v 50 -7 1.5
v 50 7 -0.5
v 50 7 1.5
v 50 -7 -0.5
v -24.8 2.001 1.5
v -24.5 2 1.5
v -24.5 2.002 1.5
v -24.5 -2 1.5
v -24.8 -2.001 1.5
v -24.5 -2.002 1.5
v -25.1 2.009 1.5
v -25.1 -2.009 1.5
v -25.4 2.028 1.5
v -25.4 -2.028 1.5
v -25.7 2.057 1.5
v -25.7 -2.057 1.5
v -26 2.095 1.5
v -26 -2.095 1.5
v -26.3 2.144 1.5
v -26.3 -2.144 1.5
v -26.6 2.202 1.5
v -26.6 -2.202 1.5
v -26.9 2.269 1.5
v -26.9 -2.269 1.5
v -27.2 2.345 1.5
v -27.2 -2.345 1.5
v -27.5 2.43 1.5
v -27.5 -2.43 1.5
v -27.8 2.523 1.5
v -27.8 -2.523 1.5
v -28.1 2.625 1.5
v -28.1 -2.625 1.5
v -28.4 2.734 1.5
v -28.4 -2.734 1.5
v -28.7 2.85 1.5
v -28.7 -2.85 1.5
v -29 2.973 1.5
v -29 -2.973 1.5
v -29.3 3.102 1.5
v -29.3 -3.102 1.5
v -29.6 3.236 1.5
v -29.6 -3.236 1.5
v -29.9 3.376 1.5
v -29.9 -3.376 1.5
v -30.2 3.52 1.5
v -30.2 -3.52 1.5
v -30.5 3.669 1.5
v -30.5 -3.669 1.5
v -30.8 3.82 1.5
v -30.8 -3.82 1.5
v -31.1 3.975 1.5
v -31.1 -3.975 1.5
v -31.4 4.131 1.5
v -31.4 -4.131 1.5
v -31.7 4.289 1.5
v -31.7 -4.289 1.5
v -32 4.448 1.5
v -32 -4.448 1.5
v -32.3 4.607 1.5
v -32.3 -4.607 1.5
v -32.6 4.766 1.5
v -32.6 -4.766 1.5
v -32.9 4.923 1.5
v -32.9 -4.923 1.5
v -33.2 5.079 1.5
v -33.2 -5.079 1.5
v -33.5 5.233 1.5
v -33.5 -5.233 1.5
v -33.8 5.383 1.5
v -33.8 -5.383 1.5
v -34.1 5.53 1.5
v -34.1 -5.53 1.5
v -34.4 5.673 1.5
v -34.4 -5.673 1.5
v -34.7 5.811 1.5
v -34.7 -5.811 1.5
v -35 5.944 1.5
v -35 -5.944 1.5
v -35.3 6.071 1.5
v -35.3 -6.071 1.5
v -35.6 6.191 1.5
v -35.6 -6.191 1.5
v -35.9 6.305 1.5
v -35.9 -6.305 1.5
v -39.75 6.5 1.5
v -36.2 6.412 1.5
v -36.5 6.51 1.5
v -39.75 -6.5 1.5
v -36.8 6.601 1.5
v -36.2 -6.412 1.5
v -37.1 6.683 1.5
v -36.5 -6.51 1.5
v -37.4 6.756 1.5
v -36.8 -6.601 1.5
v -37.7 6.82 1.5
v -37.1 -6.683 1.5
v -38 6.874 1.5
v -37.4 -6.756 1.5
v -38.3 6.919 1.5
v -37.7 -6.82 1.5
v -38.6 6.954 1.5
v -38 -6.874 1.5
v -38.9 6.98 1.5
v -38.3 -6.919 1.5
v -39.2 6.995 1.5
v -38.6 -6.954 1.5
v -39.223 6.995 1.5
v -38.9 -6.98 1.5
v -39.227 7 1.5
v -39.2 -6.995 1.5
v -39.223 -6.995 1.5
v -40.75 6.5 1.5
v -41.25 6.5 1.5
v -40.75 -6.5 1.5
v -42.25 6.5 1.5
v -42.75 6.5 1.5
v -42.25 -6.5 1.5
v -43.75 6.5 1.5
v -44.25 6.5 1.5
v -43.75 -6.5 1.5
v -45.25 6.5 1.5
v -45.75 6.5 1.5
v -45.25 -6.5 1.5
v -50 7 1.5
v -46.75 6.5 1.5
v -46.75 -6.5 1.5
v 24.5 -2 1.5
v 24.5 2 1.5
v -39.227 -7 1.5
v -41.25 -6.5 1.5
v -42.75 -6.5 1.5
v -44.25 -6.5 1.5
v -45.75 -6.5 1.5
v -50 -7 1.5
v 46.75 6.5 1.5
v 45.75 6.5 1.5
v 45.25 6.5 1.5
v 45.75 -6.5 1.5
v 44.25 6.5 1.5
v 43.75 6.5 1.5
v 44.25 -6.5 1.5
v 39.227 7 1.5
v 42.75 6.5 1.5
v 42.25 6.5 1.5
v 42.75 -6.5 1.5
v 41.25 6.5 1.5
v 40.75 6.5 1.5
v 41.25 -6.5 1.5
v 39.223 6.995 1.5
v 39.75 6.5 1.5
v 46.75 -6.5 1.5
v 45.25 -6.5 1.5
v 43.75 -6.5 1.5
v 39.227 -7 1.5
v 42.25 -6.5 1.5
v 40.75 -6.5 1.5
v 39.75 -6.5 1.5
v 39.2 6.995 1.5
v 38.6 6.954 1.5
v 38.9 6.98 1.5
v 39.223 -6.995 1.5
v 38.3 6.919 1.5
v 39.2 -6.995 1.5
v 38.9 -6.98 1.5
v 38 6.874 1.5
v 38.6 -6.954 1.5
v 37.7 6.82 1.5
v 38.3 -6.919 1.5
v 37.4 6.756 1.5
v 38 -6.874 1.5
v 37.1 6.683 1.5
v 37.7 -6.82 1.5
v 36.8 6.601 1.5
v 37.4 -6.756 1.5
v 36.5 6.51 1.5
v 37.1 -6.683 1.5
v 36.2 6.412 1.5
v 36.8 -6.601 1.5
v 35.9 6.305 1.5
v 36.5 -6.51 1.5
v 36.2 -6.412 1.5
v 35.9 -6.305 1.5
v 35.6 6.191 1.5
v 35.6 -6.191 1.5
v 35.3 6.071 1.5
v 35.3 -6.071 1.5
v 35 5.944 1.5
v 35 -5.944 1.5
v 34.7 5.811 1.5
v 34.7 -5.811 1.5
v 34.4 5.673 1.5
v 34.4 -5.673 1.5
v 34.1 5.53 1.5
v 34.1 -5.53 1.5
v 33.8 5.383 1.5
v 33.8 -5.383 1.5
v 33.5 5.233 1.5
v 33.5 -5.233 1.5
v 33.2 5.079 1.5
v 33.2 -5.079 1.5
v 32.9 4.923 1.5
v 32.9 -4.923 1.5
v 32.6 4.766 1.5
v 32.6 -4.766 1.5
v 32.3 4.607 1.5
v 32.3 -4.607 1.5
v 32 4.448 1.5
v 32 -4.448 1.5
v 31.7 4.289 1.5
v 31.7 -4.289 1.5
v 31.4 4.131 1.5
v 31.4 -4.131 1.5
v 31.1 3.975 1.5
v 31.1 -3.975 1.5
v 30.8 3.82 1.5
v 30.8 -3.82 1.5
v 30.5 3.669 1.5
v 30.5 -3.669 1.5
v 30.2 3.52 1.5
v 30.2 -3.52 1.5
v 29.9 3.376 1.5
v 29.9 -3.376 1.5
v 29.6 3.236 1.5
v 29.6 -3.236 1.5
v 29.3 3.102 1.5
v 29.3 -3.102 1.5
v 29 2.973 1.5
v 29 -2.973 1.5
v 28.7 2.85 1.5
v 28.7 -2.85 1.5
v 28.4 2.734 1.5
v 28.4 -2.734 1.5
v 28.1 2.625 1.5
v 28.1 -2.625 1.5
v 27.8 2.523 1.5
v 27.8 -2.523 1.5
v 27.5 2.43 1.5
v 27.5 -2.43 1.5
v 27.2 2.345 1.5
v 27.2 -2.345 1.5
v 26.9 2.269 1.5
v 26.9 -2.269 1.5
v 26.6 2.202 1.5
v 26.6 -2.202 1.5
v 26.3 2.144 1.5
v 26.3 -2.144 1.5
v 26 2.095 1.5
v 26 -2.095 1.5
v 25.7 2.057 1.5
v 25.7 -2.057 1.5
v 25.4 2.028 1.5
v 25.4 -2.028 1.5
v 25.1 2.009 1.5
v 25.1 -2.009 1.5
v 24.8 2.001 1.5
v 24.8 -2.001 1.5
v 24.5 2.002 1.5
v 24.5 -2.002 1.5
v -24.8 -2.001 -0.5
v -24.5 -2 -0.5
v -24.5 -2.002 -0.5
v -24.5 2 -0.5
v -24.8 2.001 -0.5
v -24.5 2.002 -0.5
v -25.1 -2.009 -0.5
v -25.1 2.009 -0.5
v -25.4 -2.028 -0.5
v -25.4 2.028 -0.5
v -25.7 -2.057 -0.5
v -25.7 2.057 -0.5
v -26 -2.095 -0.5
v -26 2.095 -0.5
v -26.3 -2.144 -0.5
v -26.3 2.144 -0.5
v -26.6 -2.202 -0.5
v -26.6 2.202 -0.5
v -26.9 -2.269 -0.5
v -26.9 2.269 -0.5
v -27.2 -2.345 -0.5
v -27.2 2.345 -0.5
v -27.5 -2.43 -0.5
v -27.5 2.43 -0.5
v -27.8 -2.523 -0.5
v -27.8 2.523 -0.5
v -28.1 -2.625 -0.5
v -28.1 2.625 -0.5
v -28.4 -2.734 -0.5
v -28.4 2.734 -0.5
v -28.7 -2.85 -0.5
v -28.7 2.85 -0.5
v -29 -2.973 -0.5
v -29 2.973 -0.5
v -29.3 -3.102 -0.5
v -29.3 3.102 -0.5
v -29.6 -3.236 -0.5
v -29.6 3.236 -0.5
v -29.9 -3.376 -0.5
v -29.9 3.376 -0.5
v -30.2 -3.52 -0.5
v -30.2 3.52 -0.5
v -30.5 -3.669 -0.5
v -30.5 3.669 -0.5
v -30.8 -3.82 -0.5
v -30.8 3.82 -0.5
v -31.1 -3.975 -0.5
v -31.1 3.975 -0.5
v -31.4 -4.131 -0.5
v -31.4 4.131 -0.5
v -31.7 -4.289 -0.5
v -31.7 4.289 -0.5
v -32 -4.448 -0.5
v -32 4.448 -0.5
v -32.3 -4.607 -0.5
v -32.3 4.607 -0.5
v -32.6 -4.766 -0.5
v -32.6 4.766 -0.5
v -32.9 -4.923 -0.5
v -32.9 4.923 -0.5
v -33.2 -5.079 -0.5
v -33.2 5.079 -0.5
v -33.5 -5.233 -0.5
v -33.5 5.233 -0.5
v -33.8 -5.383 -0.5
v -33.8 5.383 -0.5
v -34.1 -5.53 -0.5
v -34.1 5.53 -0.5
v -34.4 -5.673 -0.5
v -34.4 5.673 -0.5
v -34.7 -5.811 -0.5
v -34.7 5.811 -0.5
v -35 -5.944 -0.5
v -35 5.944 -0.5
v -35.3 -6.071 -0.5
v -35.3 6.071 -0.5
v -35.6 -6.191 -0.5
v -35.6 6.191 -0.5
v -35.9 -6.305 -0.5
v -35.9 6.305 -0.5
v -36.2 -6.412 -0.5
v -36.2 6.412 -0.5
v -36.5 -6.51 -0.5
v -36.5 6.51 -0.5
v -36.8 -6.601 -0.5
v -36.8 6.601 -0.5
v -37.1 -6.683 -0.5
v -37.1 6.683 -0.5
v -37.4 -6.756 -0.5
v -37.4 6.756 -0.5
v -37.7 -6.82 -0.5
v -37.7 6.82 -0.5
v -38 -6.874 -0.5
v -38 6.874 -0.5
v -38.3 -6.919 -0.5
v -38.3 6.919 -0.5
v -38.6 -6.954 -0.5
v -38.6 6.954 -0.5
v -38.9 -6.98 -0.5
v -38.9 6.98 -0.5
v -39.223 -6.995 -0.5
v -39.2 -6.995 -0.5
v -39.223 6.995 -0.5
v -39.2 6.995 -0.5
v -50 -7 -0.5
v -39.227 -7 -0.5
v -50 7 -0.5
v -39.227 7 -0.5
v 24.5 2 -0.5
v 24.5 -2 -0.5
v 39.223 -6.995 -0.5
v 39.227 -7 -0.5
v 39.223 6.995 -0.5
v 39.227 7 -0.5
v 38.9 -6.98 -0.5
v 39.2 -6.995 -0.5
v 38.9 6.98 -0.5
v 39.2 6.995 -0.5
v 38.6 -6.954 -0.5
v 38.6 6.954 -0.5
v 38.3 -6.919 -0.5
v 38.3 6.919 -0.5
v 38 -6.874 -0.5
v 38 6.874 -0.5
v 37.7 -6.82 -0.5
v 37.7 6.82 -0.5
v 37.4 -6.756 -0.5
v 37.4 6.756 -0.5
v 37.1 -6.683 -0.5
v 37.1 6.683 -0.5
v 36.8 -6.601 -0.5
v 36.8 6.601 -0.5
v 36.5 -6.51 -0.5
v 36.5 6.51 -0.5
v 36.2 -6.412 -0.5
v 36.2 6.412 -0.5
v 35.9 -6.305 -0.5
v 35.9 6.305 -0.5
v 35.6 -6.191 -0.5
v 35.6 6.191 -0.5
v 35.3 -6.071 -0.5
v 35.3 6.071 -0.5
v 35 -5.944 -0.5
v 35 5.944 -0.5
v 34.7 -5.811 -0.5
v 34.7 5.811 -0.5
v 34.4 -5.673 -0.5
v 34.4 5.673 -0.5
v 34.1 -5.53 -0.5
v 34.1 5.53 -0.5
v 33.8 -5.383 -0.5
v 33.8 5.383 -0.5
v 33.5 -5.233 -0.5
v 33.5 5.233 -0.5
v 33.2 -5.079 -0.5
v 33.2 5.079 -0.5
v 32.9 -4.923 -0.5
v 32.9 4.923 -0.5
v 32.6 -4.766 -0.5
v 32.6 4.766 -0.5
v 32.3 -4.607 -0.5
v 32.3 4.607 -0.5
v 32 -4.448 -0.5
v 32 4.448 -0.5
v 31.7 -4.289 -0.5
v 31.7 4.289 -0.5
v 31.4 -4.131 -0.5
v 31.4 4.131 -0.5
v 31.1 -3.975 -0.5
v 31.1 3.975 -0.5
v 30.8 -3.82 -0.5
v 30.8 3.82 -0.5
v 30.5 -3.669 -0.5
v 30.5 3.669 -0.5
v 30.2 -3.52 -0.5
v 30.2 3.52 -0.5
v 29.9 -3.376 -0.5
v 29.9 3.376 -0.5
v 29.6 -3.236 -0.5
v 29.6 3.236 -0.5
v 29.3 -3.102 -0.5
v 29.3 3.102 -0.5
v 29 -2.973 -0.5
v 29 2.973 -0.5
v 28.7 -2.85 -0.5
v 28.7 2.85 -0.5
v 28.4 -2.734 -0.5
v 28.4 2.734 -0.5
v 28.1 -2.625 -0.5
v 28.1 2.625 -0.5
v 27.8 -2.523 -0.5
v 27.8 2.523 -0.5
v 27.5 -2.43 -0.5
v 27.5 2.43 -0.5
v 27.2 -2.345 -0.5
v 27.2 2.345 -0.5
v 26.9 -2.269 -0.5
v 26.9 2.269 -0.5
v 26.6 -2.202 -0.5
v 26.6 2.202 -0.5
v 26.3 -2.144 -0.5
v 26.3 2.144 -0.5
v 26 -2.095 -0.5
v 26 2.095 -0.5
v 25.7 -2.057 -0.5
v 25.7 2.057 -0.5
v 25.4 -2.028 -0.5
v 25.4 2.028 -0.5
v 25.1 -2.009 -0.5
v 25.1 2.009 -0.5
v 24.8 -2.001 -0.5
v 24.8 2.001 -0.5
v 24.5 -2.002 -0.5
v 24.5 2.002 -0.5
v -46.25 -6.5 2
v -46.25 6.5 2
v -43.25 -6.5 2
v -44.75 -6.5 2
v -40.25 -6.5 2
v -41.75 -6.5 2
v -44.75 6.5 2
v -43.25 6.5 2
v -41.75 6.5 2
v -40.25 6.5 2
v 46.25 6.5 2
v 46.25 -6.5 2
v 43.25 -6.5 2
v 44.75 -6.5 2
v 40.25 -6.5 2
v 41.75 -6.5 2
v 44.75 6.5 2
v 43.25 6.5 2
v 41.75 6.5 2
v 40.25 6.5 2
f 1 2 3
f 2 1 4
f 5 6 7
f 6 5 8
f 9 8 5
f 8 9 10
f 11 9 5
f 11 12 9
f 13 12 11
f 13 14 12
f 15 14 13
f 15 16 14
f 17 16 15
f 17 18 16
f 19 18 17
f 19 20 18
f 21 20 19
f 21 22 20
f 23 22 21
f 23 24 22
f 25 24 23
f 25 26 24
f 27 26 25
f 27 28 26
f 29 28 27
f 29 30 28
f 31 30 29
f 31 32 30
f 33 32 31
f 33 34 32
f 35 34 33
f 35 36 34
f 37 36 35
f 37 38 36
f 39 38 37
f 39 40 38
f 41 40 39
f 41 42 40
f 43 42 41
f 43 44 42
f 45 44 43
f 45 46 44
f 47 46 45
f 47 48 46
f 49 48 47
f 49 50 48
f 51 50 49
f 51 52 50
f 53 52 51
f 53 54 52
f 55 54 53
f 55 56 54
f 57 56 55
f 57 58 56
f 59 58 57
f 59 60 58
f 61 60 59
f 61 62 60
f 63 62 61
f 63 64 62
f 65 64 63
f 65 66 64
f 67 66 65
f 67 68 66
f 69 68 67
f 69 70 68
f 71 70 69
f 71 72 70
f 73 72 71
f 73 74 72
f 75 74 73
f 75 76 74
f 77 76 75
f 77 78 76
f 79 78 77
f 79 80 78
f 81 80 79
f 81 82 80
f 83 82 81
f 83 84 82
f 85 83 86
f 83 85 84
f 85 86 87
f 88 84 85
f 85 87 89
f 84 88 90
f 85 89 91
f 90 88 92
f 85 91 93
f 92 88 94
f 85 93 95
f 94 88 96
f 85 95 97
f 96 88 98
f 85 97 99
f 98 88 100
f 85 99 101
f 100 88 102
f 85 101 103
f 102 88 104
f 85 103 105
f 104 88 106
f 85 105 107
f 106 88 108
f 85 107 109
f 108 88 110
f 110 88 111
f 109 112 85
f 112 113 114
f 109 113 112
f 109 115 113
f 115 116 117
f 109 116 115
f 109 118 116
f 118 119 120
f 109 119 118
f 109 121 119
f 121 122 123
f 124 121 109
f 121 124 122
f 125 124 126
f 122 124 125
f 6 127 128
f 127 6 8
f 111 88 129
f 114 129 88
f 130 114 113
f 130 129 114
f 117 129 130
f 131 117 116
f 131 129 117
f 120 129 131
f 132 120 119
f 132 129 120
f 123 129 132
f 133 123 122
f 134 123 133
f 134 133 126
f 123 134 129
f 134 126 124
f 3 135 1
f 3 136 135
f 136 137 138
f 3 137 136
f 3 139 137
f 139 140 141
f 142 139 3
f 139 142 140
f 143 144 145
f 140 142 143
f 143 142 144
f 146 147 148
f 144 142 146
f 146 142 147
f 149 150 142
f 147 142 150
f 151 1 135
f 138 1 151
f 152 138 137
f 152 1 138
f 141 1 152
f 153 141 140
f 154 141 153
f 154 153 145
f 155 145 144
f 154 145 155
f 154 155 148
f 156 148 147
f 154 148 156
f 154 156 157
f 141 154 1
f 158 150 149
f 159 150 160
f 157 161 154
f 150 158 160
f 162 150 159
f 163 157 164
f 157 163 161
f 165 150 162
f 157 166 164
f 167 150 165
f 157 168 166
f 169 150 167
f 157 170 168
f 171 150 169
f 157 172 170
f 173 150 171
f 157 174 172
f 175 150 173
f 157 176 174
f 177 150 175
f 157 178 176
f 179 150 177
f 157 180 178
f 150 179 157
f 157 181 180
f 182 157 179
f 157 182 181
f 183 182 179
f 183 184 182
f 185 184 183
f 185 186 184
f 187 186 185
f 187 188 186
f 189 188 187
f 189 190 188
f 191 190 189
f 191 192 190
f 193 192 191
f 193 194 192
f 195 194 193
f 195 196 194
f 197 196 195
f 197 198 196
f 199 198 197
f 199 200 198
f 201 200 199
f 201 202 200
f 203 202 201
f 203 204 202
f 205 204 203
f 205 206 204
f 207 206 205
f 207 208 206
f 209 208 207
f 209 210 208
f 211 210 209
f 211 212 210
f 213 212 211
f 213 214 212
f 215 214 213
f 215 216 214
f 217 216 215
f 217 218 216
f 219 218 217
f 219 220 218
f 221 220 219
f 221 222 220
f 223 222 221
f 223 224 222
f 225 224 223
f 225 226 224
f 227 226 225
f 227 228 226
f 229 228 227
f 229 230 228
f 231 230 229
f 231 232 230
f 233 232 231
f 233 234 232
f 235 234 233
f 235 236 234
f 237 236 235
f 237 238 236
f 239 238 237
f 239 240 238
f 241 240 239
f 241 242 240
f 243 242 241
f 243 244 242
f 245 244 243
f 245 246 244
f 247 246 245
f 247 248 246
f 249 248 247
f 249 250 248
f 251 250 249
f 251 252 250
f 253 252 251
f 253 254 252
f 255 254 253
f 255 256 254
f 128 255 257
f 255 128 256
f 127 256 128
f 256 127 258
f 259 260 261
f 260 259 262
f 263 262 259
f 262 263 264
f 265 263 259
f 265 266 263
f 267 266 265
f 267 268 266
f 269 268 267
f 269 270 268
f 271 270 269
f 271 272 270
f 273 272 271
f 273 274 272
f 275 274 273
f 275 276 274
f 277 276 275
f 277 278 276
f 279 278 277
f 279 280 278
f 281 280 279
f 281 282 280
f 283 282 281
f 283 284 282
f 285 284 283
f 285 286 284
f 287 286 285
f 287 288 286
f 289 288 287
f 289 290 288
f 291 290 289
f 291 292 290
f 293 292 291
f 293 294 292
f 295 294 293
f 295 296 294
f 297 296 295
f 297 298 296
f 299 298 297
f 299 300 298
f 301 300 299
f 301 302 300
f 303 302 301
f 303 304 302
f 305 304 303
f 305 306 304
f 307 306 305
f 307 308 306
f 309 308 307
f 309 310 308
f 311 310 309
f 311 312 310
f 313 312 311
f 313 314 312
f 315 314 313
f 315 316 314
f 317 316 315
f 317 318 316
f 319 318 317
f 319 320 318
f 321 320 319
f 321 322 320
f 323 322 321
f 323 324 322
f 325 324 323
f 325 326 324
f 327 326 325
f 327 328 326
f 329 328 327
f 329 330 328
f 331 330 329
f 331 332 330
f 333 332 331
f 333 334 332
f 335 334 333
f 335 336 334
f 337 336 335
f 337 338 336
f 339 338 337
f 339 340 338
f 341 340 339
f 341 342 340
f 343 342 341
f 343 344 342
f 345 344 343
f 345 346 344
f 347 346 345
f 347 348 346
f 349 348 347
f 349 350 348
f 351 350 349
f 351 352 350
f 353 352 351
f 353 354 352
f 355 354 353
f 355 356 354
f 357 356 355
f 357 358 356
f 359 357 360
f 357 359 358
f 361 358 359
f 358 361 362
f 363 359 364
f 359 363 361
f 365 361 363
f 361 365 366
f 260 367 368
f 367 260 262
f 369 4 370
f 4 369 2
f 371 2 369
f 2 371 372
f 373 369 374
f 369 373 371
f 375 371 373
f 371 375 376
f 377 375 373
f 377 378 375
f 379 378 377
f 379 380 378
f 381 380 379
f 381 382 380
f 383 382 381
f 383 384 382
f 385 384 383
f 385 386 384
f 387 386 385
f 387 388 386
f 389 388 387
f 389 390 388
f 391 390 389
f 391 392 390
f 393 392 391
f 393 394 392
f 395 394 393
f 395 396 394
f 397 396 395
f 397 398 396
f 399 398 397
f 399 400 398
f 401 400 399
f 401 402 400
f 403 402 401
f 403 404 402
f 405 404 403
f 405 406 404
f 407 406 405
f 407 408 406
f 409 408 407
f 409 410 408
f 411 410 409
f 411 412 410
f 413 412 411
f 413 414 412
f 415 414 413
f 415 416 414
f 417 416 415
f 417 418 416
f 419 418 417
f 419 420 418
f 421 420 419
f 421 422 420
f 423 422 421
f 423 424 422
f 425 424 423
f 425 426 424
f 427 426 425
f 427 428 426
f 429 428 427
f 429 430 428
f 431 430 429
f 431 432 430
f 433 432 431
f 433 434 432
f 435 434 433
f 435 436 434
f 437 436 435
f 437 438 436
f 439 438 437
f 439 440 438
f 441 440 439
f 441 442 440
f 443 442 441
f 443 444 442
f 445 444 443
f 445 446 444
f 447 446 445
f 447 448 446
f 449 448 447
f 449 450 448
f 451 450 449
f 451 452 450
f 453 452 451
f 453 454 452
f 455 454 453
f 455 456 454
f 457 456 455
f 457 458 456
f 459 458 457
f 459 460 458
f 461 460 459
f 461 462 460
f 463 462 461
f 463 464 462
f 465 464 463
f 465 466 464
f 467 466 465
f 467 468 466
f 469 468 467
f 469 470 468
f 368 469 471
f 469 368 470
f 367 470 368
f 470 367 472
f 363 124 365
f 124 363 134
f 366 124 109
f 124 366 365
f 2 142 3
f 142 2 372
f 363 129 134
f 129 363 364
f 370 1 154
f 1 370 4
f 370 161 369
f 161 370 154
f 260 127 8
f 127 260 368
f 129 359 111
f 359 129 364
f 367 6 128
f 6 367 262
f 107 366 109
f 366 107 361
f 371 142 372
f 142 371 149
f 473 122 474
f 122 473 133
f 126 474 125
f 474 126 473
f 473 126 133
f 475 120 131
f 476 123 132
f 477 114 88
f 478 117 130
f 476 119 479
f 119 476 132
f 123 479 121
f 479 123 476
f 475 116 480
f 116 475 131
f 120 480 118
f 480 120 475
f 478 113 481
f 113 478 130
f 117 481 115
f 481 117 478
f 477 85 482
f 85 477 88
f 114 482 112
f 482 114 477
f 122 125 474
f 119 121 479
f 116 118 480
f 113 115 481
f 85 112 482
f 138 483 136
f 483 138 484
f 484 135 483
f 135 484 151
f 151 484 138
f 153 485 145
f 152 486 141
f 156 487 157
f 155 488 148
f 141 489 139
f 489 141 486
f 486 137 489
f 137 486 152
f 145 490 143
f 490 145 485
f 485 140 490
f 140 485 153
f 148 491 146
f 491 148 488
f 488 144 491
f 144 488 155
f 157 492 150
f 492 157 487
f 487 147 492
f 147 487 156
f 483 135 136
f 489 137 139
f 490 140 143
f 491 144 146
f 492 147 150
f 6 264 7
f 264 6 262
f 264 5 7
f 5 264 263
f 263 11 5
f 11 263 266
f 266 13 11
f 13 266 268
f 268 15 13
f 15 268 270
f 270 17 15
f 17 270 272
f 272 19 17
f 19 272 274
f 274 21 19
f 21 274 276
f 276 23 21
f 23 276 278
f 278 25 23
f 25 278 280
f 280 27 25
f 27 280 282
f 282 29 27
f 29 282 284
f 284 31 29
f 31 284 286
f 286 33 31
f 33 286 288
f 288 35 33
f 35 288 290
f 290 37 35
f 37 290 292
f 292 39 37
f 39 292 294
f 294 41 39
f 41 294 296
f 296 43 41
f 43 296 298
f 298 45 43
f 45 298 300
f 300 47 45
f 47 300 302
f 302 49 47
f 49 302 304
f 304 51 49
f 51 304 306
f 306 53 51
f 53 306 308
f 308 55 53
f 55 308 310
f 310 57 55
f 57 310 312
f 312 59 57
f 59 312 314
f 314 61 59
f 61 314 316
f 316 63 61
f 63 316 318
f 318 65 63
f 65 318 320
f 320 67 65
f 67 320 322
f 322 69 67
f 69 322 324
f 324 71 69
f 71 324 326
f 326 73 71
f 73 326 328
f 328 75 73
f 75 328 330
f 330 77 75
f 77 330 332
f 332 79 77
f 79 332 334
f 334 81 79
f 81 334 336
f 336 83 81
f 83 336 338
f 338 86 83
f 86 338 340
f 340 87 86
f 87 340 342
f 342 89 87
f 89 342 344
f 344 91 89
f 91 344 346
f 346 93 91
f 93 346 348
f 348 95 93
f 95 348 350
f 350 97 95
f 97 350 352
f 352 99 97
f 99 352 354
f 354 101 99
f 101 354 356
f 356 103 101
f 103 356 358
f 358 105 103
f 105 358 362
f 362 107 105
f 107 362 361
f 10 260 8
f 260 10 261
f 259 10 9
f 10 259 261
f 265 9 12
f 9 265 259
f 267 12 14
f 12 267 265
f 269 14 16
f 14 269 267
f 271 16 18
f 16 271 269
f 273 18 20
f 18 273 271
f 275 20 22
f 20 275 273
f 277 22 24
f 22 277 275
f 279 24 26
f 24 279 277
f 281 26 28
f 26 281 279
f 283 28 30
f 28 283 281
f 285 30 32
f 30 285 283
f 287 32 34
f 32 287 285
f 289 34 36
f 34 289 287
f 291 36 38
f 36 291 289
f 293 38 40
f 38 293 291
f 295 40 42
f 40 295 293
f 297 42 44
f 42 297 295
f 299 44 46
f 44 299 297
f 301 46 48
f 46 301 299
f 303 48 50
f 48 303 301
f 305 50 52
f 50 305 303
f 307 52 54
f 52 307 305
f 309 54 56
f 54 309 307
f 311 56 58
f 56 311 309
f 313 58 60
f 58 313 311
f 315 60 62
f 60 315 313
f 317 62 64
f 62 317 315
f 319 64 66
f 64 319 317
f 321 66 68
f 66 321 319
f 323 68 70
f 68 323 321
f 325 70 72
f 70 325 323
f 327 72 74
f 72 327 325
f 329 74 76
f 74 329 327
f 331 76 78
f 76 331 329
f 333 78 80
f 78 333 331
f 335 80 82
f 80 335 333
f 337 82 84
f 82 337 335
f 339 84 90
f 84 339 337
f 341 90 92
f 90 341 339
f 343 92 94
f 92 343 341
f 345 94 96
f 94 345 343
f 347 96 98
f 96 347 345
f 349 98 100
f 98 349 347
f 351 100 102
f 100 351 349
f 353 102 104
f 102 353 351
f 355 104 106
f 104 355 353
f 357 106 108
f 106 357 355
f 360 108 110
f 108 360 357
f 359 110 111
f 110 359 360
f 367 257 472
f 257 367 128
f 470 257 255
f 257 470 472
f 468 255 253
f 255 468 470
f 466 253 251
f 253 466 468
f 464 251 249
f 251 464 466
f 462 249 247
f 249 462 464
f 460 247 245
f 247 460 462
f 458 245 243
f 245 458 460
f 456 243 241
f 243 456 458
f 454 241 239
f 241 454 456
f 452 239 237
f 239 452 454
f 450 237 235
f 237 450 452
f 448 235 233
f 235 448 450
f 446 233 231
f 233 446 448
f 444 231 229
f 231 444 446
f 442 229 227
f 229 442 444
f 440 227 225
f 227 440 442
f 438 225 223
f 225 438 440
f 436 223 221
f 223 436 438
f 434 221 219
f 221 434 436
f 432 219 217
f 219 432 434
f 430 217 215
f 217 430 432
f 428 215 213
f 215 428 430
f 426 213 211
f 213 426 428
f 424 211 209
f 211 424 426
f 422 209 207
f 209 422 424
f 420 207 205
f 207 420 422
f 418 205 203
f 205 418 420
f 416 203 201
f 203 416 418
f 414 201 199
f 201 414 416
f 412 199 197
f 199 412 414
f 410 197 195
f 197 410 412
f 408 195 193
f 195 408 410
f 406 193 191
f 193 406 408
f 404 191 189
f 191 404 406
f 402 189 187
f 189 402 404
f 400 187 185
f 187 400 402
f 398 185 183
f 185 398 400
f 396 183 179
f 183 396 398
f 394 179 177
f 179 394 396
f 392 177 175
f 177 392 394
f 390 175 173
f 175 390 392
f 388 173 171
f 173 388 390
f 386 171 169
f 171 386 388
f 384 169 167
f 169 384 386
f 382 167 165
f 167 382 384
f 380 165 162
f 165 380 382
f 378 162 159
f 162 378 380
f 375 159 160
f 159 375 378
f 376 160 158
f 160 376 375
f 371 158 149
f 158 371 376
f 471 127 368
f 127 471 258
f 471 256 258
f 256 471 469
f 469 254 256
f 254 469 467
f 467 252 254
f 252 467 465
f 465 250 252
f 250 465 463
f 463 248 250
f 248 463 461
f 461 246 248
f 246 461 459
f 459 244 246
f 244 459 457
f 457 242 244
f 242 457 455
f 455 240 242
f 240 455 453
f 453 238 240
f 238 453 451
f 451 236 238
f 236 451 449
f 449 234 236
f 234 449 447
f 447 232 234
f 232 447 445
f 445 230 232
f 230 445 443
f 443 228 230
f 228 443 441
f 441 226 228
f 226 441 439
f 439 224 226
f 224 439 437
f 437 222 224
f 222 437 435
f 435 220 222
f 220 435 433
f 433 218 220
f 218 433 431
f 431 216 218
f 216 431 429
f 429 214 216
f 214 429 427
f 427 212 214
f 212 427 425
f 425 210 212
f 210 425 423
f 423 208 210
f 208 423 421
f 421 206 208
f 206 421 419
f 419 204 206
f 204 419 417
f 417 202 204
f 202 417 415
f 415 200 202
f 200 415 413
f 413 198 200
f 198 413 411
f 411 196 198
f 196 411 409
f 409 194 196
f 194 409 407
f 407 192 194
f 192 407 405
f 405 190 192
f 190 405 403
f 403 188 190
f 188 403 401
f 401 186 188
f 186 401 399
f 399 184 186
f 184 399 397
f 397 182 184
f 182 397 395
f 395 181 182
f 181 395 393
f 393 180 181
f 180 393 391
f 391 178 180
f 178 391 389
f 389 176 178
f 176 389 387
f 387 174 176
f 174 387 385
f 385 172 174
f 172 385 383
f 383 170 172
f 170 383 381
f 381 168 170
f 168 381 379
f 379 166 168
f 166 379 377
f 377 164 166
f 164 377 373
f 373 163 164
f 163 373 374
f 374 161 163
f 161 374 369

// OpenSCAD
$fn=60;
difference(){
translate([0,0,0.5])cube([100,14,2],center=true);
hull(){
translate([-29,-15,-2])cylinder(d=26,h=4);
translate([29,-15,-2])cylinder(d=26,h=4);
}
hull(){
translate([-29,15,-2])cylinder(d=26,h=4);
translate([29,15,-2])cylinder(d=26,h=4);
}
}
translate([-47,-7.5,0.5])teeth();
mirror([1,0,0])translate([-47,-7.5,0.5])teeth();

module teeth(){
intersection(){
rotate([-90,0,0])translate([0.75,0,0])
union(){
translate([0,0,1])cylinder(d=3,h=14,$fn=4);
translate([1.5,0,1])cylinder(d=3,h=14,$fn=4);
translate([3,0,1])cylinder(d=3,h=14,$fn=4);
translate([4.5,0,1])cylinder(d=3,h=14,$fn=4);
translate([6,0,1])cylinder(d=3,h=14,$fn=4);
}
translate([0,0,0])cube([7.5,14,10]);
}
}

//cube(4,center=true);

difference(){
translate([-39.5,4.5,-0.5])
scale([1.5,2.5,1])curva(2);
translate([0,-5,0])cube([100,10,4],center=true);
}
mirror([0,1,0])
difference(){
translate([-39.5,4.5,-0.5])
scale([1.5,2.5,1])curva(2);
translate([0,-5,0])cube([100,10,4],center=true);
}
mirror([1,0,0])
difference(){
translate([-39.5,4.5,-0.5])
scale([1.5,2.5,1])curva(2);
translate([0,-5,0])cube([100,10,4],center=true);
}
mirror([0,1,0])mirror([1,0,0])
difference(){
translate([-39.5,4.5,-0.5])
scale([1.5,2.5,1])curva(2);
translate([0,-5,0])cube([100,10,4],center=true);
}



module curva(e){
linear_extrude(e)
polygon([[0,1.0000],[0.2000,0.9980],[0.4000,0.9919],
[0.6000,0.9818],[0.8000,0.9678],[1.0000,0.9498],
[1.2000,0.9279],[1.4000,0.9023],[1.6000,0.8731],
[1.8000,0.8403],[2.0000,0.8041],[2.2000,0.7647],
[2.4000,0.7221],[2.6000,0.6766],[2.8000,0.6284],
[3.0000,0.5777],[3.2000,0.5246],[3.4000,0.4693],
[3.6000,0.4122],[3.8000,0.3534],[4.0000,0.2932],
[4.2000,0.2318],[4.4000,0.1694],[4.6000,0.1064],
[4.8000,0.0429],[5.0000,-0.0208],[5.2000,-0.0843],
[5.4000,-0.1475],[5.6000,-0.2102],[5.8000,-0.2719],
[6.0000,-0.3326],[6.2000,-0.3919],[6.4000,-0.4497],
[6.6000,-0.5056],[6.8000,-0.5594],[7.0000,-0.6110],
[7.2000,-0.6602],[7.4000,-0.7066],[7.6000,-0.7502],
[7.8000,-0.7907],[8.0000,-0.8281],[8.2000,-0.8621],
[8.4000,-0.8926],[8.6000,-0.9194],[8.8000,-0.9426],
[9.0000,-0.9619],[9.2000,-0.9774],[9.4000,-0.9888],
[9.6000,-0.9963],[9.8000,-0.9998],[10.0000,-0.9991],
[10.0000,-1.9991],[9.8000,-1.9998],[9.6000,-1.9963],
[9.4000,-1.9888],[9.2000,-1.9774],[9.0000,-1.9619],
[8.8000,-1.9426],[8.6000,-1.9194],[8.4000,-1.8926],
[8.2000,-1.8621],[8.0000,-1.8281],[7.8000,-1.7907],
[7.6000,-1.7502],[7.4000,-1.7066],[7.2000,-1.6602],
[7.0000,-1.6110],[6.8000,-1.5594],[6.6000,-1.5056],
[6.4000,-1.4497],[6.2000,-1.3919],[6.0000,-1.3326],
[5.8000,-1.2719],[5.6000,-1.2102],[5.4000,-1.1475],
[5.2000,-1.0843],[5.0000,-1.0208],[4.8000,.0429-1],
[4.6000,.1064-1],[4.4000,.1694-1],[4.2000,.2318-1],
[4.0000,.2932-1],[3.8000,.3534-1],[3.6000,.4122-1],
[3.4000,.4693-1],[3.2000,.5246-1],[3.0000,.5777-1],
[2.8000,.6284-1],[2.6000,.6766-1],[2.4000,.7221-1],
[2.2000,.7647-1],[2.0000,.8041-1],[1.8000,.8403-1],
[1.6000,.8731-1],[1.4000,.9023-1],[1.2000,.9279-1],
[1.0000,.9498-1],[0.8000,.9678-1],[0.6000,.9818-1],
[0.4000,.9919-1],[0.2000,.9980-1],[0,.0000]
]);
}
